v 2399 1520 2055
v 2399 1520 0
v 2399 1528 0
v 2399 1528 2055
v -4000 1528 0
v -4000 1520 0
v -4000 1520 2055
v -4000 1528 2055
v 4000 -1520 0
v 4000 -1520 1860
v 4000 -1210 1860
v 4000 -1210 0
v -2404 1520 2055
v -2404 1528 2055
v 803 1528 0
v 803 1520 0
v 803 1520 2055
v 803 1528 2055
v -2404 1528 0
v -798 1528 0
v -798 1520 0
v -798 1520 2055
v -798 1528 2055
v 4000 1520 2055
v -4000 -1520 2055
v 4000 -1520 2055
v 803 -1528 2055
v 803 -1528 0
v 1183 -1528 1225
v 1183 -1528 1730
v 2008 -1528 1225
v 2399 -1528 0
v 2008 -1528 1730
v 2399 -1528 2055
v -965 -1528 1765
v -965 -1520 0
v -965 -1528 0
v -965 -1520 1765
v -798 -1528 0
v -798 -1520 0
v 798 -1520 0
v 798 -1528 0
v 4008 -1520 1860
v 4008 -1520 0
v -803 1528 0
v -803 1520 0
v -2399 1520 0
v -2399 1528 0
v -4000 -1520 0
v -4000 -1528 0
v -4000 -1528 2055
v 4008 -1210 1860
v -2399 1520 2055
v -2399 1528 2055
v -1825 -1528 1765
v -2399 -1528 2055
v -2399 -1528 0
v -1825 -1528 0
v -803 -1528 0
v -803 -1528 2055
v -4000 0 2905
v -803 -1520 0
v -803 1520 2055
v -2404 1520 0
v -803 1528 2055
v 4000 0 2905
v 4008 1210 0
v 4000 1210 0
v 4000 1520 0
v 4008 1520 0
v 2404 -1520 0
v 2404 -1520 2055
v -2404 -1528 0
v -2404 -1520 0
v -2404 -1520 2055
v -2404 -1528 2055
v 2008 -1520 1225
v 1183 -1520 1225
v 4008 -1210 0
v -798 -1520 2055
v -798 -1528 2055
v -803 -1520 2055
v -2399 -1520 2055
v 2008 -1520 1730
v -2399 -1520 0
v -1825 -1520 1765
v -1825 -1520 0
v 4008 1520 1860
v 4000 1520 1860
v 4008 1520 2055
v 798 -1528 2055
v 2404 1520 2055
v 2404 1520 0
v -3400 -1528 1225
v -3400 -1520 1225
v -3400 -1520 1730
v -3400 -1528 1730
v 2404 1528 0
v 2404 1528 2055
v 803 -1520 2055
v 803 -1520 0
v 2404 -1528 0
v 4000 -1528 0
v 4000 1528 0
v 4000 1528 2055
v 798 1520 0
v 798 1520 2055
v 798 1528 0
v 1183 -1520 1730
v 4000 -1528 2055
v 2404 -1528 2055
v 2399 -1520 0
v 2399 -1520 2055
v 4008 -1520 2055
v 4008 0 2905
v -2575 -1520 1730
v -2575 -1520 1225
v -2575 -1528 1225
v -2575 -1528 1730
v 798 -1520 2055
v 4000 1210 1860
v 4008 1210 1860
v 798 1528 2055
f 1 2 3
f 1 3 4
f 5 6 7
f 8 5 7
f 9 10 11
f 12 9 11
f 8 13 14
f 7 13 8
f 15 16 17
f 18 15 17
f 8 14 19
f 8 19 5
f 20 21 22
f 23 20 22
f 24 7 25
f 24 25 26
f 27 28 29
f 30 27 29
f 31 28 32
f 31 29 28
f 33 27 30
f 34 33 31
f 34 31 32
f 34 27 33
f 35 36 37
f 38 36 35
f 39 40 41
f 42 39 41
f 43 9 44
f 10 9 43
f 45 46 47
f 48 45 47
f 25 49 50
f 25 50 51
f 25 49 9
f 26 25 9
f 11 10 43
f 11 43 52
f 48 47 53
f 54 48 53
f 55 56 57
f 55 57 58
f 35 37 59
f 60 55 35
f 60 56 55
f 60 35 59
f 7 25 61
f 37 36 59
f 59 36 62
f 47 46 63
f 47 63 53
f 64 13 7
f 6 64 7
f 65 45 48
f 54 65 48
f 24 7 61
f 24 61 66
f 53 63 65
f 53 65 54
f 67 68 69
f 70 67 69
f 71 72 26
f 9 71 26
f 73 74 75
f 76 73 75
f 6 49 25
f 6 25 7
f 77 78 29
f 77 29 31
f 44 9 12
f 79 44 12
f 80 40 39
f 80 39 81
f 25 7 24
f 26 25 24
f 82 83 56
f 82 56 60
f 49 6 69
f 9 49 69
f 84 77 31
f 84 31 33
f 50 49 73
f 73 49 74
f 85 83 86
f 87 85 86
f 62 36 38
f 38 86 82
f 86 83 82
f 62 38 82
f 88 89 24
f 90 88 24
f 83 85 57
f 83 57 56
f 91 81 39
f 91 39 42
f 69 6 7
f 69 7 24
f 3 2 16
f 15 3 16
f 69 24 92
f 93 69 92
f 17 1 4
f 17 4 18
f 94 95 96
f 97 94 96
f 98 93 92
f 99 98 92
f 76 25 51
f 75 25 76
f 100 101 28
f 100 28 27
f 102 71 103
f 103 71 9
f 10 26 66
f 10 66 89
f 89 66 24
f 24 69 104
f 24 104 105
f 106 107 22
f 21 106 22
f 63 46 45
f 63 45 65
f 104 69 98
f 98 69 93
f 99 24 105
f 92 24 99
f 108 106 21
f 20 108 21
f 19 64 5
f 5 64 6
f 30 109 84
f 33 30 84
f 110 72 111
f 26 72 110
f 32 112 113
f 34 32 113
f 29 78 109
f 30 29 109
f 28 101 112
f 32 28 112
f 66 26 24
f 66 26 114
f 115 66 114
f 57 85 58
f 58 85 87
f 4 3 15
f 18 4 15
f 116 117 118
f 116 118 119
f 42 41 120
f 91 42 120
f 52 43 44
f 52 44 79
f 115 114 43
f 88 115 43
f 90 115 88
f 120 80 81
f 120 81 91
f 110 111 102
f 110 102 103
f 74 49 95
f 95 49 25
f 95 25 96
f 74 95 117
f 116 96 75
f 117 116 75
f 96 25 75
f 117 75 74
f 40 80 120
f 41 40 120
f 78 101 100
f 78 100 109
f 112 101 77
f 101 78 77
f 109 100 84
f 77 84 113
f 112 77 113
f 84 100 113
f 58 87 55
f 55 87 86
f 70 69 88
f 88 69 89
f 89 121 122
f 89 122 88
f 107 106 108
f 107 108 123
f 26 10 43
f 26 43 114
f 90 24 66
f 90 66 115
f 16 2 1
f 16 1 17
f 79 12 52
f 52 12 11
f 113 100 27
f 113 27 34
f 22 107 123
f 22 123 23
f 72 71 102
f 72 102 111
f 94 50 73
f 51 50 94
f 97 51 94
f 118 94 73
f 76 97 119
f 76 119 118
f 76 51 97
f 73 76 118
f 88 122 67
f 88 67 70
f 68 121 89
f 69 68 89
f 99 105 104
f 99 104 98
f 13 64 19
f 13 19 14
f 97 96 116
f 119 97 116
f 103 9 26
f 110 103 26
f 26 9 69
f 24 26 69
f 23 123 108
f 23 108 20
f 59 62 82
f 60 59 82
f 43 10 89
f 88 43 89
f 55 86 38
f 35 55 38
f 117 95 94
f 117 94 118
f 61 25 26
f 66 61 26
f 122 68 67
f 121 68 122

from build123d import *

# Parameters (mm, degrees)
F0_W        = 8000
F0_H        = 3040
F1_DEPTH    = 2055
F2_W        = 1596
F2_H        = 2055
F3_DEPTH    = 8
F4_W        = 310
F4_H        = 1860
F5_DEPTH    = 8
F6_W        = 1596
F6_H        = 2055
F7_DEPTH    = 8
F8_W        = 825
F8_H        = 505
F8_W_2      = 860
F8_H_2      = 1800
F9_DEPTH    = 8
F10_DEPTH   = 850
F11_SIZE2   = 849.99999
F11_SIZE    = 1519.99999
F12_W       = 3040
F12_H       = 1045
F13_DEPTH   = 8
F14_SIZE2   = 1520
F14_SIZE    = 850
F14_2_SIZE2 = 1519.99999
F14_2_SIZE  = 849.99999


# Not quite as in the source:
# - a fillet or chamfer is up to 0.001 mm smaller than in the source, because OpenCascade refuses the exact size


with BuildPart() as f1:
    # F0 (on Top) → F1 (new body)
    with BuildSketch(Plane.XY):
        Rectangle(F0_W, F0_H)
    extrude(amount=F1_DEPTH)


with BuildPart() as f3:
    # F2 (on face) → F3 (new body)
    with BuildSketch(Plane.XZ.offset(1520)):
        with Locations((3202, 1027.5)):
            Rectangle(F2_W, F2_H)
    extrude(amount=F3_DEPTH)


with BuildPart() as f3b:
    # F2 (on face) → F3, piece 2 (new body)
    with BuildSketch(Plane.XZ.offset(1520)):
        with Locations((1601, 1027.5)):
            Rectangle(F2_W, F2_H)
    extrude(amount=F3_DEPTH)


with BuildPart() as f3c:
    # F2 (on face) → F3, piece 3 (new body)
    with BuildSketch(Plane.XZ.offset(1520)):
        with Locations((0, 1027.5)):
            Rectangle(F2_W, F2_H)
    extrude(amount=F3_DEPTH)


with BuildPart() as f3d:
    # F2 (on face) → F3, piece 4 (new body)
    with BuildSketch(Plane.XZ.offset(1520)):
        with Locations((-1601, 1027.5)):
            Rectangle(F2_W, F2_H)
    extrude(amount=F3_DEPTH)


with BuildPart() as f3e:
    # F2 (on face) → F3, piece 5 (new body)
    with BuildSketch(Plane.XZ.offset(1520)):
        with Locations((-3202, 1027.5)):
            Rectangle(F2_W, F2_H)
    extrude(amount=F3_DEPTH)


with BuildPart() as f5:
    # F4 (on face) → F5 (new body)
    with BuildSketch(Plane.YZ.offset(4000)):
        with Locations((-1365, 930)):
            Rectangle(F4_W, F4_H)
    extrude(amount=F5_DEPTH)


with BuildPart() as f5b:
    # F4 (on face) → F5, piece 2 (new body)
    with BuildSketch(Plane.YZ.offset(4000)):
        with Locations((1365, 930)):
            Rectangle(F4_W, F4_H)
    extrude(amount=F5_DEPTH)


with BuildPart() as f7:
    # F6 (on face) → F7 (new body)
    with BuildSketch(Plane(origin=(0, 1520, 0), x_dir=(-1, 0, 0), z_dir=(0, 1, 0))):
        with Locations((-3202, 1027.5)):
            Rectangle(F6_W, F6_H)
    extrude(amount=F7_DEPTH)


with BuildPart() as f7b:
    # F6 (on face) → F7, piece 2 (new body)
    with BuildSketch(Plane(origin=(0, 1520, 0), x_dir=(-1, 0, 0), z_dir=(0, 1, 0))):
        with Locations((-1601, 1027.5)):
            Rectangle(F6_W, F6_H)
    extrude(amount=F7_DEPTH)


with BuildPart() as f7c:
    # F6 (on face) → F7, piece 3 (new body)
    with BuildSketch(Plane(origin=(0, 1520, 0), x_dir=(-1, 0, 0), z_dir=(0, 1, 0))):
        with Locations((0, 1027.5)):
            Rectangle(F6_W, F6_H)
    extrude(amount=F7_DEPTH)


with BuildPart() as f7d:
    # F6 (on face) → F7, piece 4 (new body)
    with BuildSketch(Plane(origin=(0, 1520, 0), x_dir=(-1, 0, 0), z_dir=(0, 1, 0))):
        with Locations((1601, 1027.5)):
            Rectangle(F6_W, F6_H)
    extrude(amount=F7_DEPTH)


with BuildPart() as f7e:
    # F6 (on face) → F7, piece 5 (new body)
    with BuildSketch(Plane(origin=(0, 1520, 0), x_dir=(-1, 0, 0), z_dir=(0, 1, 0))):
        with Locations((3202, 1027.5)):
            Rectangle(F6_W, F6_H)
    extrude(amount=F7_DEPTH)


with BuildPart() as f9_tool:
    # F8 (on face) → F9 (new body)
    with BuildSketch(Plane.XZ.offset(1520)):
        with Locations((1595.5, 1477.5)):
            Rectangle(F8_W, F8_H)
        with Locations((-2987.5, 1477.5)):
            Rectangle(F8_W, F8_H)
        with Locations((-1395, 865)):
            Rectangle(F8_W_2, F8_H_2)
    extrude(amount=F9_DEPTH)


with BuildPart() as f3b_1:
    add(f3b.part)

    # F9: cut by f9_tool
    add(f9_tool.part, mode=Mode.SUBTRACT)


with BuildPart() as f3d_1:
    add(f3d.part)

    # F9: cut by f9_tool
    add(f9_tool.part, mode=Mode.SUBTRACT)


with BuildPart() as f3e_1:
    add(f3e.part)

    # F9: cut by f9_tool
    add(f9_tool.part, mode=Mode.SUBTRACT)


with BuildPart() as f10:
    # F10 (new): a face of the model
    f10_faces = [f1.part.faces().sort_by_distance(p)[0] for p in [
        (0, 0, 2055),
    ]]
    extrude(f10_faces, amount=F10_DEPTH)

    # F11 (size 1520 and 850 in the source; OpenCascade refuses exactly that, so slightly less here)
    f11_edges = [f10.edges().sort_by_distance(p)[0] for p in [
        (0, -1520, 2905),
        (0, 1520, 2905),
    ]]
    f11_side = f10.faces().sort_by_distance((0, 0, 2905))[0]
    chamfer(f11_edges, length=F11_SIZE, length2=F11_SIZE2, reference=f11_side)


with BuildPart() as f13:
    # F12 (on face) → F13 (new body)
    with BuildSketch(Plane.YZ.offset(4000)):
        with Locations((0, 2382.5)):
            Rectangle(F12_W, F12_H)
    extrude(amount=F13_DEPTH)

    # F14
    f14_edges = [f13.edges().sort_by_distance(p)[0] for p in [
        (4004, -1520, 2905),
    ]]
    f14_side = f13.faces().sort_by_distance((4004, -1520, 2382.5))[0]
    chamfer(f14_edges, length=F14_SIZE, length2=F14_SIZE2, reference=f14_side)

    # F14#2 (size 850 and 1520 in the source; OpenCascade refuses exactly that, so slightly less here)
    f14_2_edges = [f13.edges().sort_by_distance(p)[0] for p in [
        (4004, 1520, 2905),
    ]]
    f14_2_side = f13.faces().sort_by_distance((4004, 1520, 2382.5))[0]
    chamfer(f14_2_edges, length=F14_2_SIZE, length2=F14_2_SIZE2, reference=f14_2_side)


solid = Compound([f1.part, f3.part, f3c.part, f5.part, f5b.part, f7.part, f7b.part, f7c.part, f7d.part, f7e.part, f3b_1.part, f3d_1.part, f3e_1.part, f10.part, f13.part])
